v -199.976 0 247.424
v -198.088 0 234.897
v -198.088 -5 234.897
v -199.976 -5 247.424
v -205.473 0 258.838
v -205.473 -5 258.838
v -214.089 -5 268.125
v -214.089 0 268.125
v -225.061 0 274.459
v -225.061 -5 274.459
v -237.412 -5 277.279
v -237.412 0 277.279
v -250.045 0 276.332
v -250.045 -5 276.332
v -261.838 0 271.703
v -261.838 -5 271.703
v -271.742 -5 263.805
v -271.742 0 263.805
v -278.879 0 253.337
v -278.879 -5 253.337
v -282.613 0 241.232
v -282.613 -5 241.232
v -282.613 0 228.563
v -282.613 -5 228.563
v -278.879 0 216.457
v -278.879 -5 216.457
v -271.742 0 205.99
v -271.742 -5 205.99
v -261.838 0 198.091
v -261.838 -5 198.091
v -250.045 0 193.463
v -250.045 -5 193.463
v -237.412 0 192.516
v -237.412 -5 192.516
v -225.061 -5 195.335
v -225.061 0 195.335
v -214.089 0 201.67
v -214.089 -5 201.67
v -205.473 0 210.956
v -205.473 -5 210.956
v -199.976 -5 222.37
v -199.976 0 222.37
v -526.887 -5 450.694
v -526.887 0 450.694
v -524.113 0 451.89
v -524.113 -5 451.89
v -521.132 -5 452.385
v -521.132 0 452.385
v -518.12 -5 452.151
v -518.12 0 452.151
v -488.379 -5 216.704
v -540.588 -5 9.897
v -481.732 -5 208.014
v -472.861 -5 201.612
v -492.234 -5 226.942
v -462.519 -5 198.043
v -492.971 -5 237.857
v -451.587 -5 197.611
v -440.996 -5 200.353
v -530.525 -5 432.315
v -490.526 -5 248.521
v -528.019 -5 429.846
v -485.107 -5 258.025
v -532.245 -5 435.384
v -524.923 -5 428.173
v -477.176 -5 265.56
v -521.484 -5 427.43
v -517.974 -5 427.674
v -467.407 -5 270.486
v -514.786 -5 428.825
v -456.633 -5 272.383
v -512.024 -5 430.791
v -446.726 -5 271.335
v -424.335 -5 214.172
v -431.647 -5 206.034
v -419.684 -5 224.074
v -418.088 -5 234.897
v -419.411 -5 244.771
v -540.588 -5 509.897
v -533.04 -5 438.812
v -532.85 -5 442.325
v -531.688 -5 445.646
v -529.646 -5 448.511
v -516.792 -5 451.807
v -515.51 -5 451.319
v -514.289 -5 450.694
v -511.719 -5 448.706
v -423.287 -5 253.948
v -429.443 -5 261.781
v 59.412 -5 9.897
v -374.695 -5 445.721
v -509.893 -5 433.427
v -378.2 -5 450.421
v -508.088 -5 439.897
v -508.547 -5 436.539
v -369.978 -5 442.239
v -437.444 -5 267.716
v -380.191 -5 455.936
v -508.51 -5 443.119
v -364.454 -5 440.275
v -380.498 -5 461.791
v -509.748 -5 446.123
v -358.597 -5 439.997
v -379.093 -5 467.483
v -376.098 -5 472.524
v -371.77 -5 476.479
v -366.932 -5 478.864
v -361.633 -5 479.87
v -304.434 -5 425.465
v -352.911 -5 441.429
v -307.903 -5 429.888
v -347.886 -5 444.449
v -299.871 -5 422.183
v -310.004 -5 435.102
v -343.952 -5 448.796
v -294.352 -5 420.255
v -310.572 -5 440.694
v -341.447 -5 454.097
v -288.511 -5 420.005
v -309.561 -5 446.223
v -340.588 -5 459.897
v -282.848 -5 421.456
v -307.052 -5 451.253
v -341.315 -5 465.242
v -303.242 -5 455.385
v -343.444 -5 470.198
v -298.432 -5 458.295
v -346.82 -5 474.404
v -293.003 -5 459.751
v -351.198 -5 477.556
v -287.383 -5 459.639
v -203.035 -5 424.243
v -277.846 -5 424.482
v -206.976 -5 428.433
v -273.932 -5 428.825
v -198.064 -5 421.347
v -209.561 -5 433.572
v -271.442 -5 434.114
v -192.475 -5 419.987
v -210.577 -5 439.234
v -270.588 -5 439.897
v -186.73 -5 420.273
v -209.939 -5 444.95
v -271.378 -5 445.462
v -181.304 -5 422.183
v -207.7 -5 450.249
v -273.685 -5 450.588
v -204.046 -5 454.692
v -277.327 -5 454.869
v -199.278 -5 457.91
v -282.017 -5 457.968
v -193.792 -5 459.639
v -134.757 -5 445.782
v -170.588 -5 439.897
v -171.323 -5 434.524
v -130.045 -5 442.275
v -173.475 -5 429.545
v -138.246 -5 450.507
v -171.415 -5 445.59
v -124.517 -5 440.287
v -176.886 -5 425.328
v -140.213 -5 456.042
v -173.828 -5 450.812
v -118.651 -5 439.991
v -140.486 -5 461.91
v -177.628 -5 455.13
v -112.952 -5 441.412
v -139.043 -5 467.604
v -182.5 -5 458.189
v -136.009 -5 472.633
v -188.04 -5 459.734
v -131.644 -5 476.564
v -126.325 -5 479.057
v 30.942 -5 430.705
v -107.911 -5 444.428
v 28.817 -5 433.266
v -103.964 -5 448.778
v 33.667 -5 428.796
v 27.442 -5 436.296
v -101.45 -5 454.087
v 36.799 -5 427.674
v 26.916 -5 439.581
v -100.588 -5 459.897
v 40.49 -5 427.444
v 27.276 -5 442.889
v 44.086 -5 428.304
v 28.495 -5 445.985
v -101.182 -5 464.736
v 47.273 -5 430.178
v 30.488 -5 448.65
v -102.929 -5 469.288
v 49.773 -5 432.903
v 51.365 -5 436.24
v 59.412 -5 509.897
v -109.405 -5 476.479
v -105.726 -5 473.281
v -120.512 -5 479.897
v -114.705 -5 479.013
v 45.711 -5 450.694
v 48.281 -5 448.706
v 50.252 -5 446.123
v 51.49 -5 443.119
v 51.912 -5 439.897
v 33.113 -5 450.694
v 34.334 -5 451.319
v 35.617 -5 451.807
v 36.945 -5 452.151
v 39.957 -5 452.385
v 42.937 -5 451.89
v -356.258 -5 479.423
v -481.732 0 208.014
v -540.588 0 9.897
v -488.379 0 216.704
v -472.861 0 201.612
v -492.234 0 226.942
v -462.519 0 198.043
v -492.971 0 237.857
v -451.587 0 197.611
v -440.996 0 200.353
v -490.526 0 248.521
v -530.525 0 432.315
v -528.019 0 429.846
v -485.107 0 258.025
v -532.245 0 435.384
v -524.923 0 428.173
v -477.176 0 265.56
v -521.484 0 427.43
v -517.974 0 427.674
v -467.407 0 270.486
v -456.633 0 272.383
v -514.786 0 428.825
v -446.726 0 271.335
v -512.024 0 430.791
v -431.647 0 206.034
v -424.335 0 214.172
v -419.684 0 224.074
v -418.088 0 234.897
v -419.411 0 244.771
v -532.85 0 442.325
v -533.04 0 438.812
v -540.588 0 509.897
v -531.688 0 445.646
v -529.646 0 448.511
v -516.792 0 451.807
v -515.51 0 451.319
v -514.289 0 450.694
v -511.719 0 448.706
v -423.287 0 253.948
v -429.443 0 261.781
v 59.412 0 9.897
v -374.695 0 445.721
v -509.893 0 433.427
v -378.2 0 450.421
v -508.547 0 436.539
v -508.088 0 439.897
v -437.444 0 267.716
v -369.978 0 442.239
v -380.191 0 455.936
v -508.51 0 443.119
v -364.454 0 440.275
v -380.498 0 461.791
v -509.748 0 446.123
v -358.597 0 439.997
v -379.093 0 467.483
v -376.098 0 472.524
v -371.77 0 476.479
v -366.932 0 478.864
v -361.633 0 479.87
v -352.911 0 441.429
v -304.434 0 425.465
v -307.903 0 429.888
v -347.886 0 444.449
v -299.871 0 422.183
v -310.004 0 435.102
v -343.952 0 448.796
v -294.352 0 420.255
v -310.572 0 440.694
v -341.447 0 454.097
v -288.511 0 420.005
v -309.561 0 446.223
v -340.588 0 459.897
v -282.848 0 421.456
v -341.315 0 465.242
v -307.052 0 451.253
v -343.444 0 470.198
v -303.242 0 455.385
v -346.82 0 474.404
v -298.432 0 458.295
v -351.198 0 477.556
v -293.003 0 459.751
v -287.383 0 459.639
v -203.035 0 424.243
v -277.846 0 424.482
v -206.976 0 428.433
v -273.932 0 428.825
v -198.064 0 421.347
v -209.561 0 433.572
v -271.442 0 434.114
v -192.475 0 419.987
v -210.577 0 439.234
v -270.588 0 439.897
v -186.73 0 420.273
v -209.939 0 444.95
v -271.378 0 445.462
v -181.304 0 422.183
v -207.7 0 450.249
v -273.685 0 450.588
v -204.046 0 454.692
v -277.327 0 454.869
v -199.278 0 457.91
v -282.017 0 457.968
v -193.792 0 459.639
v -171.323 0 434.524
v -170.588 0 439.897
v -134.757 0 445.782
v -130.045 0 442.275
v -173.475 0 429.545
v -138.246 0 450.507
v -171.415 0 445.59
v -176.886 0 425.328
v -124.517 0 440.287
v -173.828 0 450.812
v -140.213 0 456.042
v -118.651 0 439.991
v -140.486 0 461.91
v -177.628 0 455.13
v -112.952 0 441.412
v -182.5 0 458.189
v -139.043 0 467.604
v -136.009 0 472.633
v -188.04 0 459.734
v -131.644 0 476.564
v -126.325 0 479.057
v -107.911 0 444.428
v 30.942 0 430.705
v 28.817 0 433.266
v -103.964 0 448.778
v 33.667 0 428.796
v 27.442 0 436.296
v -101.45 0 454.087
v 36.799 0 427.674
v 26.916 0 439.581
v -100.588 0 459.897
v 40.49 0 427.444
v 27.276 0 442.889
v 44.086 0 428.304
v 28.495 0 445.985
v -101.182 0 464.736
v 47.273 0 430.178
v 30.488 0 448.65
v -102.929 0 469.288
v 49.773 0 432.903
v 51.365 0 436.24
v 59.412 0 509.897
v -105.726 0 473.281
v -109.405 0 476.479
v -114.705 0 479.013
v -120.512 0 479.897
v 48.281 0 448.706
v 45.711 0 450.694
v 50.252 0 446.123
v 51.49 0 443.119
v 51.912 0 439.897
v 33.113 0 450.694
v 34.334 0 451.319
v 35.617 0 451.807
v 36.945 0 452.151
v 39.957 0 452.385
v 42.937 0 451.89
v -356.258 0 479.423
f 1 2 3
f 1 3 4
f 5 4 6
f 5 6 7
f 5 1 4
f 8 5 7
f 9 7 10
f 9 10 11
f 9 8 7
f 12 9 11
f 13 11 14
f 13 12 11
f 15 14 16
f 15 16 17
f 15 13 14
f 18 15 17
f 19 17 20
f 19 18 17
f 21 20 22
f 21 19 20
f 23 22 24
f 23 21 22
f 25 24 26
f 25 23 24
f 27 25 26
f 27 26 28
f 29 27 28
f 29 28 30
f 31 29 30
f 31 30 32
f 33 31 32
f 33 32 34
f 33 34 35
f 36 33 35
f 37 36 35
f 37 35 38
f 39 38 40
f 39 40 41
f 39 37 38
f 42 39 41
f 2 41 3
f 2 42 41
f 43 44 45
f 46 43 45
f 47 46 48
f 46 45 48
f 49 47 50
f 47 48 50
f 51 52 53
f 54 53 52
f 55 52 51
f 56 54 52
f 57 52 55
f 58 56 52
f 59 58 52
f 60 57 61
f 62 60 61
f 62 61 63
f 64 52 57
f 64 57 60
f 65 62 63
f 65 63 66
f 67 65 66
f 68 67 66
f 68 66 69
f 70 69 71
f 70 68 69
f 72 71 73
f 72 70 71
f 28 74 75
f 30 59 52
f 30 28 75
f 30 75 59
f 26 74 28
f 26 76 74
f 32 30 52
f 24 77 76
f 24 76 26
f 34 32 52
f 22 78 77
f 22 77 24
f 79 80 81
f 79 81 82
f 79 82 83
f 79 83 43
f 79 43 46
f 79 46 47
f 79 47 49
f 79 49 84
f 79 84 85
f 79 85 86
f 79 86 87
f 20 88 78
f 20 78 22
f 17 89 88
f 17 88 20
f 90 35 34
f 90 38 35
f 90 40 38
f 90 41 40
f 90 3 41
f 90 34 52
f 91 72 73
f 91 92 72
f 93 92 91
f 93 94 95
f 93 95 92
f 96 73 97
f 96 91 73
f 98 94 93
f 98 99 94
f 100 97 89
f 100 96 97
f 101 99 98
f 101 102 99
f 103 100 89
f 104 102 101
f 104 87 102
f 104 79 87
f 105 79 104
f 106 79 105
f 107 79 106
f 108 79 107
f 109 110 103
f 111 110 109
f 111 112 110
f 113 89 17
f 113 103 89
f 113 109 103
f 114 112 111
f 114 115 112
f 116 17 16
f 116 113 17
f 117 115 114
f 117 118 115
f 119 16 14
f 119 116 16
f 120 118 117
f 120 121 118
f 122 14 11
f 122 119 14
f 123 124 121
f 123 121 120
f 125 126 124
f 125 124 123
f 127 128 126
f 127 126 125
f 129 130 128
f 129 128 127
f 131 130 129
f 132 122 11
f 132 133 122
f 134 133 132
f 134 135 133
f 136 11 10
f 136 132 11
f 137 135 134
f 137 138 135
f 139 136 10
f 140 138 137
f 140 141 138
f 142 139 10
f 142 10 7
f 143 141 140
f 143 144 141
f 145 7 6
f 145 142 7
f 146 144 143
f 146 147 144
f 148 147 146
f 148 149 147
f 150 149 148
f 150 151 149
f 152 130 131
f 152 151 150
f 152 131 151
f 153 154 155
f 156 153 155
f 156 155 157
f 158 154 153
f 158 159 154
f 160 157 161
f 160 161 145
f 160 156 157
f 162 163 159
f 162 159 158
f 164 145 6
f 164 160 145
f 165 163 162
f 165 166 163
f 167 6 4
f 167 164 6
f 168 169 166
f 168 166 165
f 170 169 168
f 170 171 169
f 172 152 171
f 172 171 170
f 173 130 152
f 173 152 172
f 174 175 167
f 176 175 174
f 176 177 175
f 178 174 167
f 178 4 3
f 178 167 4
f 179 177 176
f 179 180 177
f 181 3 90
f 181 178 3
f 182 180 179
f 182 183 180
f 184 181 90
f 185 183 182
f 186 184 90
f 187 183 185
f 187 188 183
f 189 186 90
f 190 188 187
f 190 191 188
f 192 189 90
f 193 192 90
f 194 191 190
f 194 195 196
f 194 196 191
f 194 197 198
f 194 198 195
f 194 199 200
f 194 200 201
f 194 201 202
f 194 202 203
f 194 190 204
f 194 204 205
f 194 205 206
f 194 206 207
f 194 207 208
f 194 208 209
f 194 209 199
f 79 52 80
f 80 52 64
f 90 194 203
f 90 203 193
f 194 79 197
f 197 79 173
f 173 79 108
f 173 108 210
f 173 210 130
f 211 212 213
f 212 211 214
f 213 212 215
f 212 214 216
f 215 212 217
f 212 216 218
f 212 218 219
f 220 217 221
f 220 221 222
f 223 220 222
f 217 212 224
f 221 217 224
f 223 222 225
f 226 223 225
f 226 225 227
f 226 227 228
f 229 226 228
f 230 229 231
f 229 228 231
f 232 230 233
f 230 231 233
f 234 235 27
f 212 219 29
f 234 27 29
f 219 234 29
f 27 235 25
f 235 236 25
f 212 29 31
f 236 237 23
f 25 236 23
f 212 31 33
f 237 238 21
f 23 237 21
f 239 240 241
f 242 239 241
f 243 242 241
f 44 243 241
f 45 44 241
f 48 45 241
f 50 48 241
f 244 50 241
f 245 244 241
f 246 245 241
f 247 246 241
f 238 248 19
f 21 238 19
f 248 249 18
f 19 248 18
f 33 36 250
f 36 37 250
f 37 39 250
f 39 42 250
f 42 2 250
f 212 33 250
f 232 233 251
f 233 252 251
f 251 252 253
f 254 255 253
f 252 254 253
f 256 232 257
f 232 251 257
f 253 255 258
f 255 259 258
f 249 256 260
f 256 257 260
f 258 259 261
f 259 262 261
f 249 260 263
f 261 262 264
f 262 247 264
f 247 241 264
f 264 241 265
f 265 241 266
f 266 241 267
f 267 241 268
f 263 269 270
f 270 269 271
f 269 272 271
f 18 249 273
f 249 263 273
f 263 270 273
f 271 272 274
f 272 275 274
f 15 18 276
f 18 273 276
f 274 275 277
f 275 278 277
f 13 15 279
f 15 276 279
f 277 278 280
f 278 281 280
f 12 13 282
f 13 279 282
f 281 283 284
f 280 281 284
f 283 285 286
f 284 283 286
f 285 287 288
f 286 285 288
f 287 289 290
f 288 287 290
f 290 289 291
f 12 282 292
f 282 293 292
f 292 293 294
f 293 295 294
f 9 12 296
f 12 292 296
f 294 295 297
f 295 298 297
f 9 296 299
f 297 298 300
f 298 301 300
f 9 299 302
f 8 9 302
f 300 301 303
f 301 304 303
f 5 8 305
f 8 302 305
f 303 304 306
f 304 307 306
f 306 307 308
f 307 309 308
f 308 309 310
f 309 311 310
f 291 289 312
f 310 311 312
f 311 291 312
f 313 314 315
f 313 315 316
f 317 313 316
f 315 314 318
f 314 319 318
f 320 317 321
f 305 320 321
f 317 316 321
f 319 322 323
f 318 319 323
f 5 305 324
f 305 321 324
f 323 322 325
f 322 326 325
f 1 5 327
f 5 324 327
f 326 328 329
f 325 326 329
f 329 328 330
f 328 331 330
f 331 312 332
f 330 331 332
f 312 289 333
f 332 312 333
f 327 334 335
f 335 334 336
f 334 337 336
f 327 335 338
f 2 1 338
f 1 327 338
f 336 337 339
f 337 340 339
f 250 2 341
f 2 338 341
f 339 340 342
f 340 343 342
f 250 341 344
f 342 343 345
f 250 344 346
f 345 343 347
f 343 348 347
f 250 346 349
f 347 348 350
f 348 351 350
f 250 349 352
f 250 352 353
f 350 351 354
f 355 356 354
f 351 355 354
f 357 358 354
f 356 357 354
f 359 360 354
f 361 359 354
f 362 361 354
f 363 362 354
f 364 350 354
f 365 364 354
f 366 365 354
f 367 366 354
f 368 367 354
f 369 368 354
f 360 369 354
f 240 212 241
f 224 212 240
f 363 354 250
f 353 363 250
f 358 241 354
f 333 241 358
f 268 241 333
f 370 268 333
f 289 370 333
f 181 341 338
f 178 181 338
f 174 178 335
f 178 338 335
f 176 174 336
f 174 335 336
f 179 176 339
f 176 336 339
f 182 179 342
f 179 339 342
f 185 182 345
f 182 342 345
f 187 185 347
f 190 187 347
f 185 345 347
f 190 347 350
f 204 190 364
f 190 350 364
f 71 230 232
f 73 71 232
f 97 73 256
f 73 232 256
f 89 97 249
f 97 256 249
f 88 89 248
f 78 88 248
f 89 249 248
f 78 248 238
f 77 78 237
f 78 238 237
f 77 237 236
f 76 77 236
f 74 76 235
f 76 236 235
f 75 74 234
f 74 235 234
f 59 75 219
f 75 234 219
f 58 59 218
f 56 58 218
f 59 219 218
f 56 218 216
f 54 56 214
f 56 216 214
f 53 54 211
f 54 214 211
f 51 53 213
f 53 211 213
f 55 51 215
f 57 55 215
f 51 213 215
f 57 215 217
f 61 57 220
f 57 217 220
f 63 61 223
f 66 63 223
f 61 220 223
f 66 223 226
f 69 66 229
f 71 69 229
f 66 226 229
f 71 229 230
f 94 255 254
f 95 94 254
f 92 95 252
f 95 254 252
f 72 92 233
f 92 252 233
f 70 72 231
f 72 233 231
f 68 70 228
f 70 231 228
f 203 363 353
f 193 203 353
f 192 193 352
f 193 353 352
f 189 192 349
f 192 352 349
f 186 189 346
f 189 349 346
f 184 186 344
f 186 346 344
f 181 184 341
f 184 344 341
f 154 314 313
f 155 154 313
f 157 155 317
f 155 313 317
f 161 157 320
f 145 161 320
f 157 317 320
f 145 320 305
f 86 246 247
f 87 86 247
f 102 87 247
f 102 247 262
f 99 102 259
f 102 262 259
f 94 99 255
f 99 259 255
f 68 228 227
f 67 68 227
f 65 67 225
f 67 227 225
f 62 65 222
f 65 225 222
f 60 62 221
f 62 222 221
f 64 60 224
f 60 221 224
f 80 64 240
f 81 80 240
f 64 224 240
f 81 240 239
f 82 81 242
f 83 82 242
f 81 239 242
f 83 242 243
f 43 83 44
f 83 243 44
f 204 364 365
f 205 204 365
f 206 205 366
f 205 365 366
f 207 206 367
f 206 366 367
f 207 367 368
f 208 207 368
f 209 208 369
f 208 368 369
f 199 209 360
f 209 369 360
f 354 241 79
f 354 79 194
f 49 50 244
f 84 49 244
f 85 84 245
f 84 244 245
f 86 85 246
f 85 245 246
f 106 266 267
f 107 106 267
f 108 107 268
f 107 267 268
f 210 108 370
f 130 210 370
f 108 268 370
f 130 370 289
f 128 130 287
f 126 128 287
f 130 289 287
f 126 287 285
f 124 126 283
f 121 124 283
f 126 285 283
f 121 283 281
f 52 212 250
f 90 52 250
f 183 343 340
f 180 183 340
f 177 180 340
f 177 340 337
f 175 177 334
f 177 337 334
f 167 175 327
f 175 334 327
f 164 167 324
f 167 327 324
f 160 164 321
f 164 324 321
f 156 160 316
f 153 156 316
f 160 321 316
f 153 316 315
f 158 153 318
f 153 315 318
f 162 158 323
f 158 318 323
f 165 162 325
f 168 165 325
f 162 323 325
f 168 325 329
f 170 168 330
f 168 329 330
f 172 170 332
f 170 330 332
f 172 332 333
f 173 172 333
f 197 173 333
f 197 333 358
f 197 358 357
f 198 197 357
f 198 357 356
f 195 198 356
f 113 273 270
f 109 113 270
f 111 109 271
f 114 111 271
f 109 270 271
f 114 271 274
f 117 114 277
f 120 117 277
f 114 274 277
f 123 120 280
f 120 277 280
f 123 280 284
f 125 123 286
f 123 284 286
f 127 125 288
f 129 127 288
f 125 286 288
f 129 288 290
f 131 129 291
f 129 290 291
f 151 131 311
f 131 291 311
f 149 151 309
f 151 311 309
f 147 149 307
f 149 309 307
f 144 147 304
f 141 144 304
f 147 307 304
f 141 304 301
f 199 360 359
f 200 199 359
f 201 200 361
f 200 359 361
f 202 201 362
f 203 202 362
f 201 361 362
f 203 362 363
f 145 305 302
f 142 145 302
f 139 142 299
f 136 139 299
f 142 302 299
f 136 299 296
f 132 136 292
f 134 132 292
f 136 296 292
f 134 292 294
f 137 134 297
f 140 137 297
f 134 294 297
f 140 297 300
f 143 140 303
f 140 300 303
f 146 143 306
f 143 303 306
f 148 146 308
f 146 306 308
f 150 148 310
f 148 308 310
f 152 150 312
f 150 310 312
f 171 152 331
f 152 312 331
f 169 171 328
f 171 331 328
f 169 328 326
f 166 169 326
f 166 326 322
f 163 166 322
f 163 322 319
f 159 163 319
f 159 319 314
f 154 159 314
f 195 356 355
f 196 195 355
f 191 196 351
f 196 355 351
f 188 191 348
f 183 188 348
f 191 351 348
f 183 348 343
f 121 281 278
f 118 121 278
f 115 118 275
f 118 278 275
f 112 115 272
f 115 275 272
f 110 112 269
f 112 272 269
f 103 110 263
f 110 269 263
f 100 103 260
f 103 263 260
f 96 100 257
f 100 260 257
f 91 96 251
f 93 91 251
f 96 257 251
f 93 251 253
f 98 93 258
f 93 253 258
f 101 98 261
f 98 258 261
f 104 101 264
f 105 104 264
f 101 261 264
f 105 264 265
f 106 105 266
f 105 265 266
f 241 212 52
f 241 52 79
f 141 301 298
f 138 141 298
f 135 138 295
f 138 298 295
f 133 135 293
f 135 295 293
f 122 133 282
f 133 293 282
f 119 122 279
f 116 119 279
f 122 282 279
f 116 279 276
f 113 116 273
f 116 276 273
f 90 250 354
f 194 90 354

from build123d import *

# Parameters (mm, degrees)
F0_W     = 600
F0_H     = 500
F0_R     = 42.5
F1_DEPTH = 5


with BuildPart() as f1:
    # F0 (on Front) → F1 (new body)
    with BuildSketch(Plane.XZ):
        with Locations((-240.587708, 259.897342)):
            Rectangle(F0_W, F0_H)
        with BuildLine():
            ThreePointArc((-418.087708, 234.897342), (-481.732182, 208.013955), (-456.632586, 272.382782))
            ThreePointArc((-456.632586, 272.382782), (-429.443234, 261.780728), (-418.087708, 234.897342))
        make_face(mode=Mode.SUBTRACT)
        with Locations((-240.587708, 234.897342)):
            Circle(F0_R, mode=Mode.SUBTRACT)
        with BuildLine():
            ThreePointArc((-526.886874, 450.694124), (-522.637445, 452.22814), (-518.12026, 452.15139))
            ThreePointArc((-518.12026, 452.15139), (-516.144254, 451.580908), (-514.288543, 450.694124))
            ThreePointArc((-514.288543, 450.694124), (-509.748207, 446.12271), (-508.087708, 439.897342))
            ThreePointArc((-508.087708, 439.897342), (-510.868779, 432.036526), (-517.974496, 427.673548))
            ThreePointArc((-517.974496, 427.673548), (-532.244607, 435.384393), (-526.886874, 450.694124))
        make_face(mode=Mode.SUBTRACT)
        with BuildLine():
            ThreePointArc((-270.587708, 439.897342), (-280.235755, 422.784859), (-299.871415, 422.18258))
            ThreePointArc((-299.871415, 422.18258), (-300.939661, 457.009825), (-270.587708, 439.897342))
        make_face(mode=Mode.SUBTRACT)
        with BuildLine():
            ThreePointArc((-371.770186, 476.479024), (-351.197542, 477.555903), (-340.587708, 459.897342))
            ThreePointArc((-340.587708, 459.897342), (-369.977874, 442.238781), (-371.770186, 476.479024))
        make_face(mode=Mode.SUBTRACT)
        with BuildLine():
            ThreePointArc((-170.587708, 439.897342), (-173.475225, 429.545389), (-181.304001, 422.18258))
            ThreePointArc((-181.304001, 422.18258), (-207.700191, 450.249295), (-170.587708, 439.897342))
        make_face(mode=Mode.SUBTRACT)
        with BuildLine():
            ThreePointArc((-100.587708, 459.897342), (-138.246269, 450.507175), (-109.405231, 476.479024))
            ThreePointArc((-109.405231, 476.479024), (-102.929147, 469.287508), (-100.587708, 459.897342))
        make_face(mode=Mode.SUBTRACT)
        with BuildLine():
            ThreePointArc((51.912292, 439.897342), (47.273108, 430.178413), (36.79908, 427.673548))
            ThreePointArc((36.79908, 427.673548), (27.069507, 437.921069), (33.113126, 450.694124))
            ThreePointArc((33.113126, 450.694124), (34.968838, 451.580908), (36.944844, 452.15139))
            ThreePointArc((36.944844, 452.15139), (41.462029, 452.22814), (45.711457, 450.694124))
            ThreePointArc((45.711457, 450.694124), (50.251793, 446.12271), (51.912292, 439.897342))
        make_face(mode=Mode.SUBTRACT)
    extrude(amount=F1_DEPTH)


solid = f1.part
